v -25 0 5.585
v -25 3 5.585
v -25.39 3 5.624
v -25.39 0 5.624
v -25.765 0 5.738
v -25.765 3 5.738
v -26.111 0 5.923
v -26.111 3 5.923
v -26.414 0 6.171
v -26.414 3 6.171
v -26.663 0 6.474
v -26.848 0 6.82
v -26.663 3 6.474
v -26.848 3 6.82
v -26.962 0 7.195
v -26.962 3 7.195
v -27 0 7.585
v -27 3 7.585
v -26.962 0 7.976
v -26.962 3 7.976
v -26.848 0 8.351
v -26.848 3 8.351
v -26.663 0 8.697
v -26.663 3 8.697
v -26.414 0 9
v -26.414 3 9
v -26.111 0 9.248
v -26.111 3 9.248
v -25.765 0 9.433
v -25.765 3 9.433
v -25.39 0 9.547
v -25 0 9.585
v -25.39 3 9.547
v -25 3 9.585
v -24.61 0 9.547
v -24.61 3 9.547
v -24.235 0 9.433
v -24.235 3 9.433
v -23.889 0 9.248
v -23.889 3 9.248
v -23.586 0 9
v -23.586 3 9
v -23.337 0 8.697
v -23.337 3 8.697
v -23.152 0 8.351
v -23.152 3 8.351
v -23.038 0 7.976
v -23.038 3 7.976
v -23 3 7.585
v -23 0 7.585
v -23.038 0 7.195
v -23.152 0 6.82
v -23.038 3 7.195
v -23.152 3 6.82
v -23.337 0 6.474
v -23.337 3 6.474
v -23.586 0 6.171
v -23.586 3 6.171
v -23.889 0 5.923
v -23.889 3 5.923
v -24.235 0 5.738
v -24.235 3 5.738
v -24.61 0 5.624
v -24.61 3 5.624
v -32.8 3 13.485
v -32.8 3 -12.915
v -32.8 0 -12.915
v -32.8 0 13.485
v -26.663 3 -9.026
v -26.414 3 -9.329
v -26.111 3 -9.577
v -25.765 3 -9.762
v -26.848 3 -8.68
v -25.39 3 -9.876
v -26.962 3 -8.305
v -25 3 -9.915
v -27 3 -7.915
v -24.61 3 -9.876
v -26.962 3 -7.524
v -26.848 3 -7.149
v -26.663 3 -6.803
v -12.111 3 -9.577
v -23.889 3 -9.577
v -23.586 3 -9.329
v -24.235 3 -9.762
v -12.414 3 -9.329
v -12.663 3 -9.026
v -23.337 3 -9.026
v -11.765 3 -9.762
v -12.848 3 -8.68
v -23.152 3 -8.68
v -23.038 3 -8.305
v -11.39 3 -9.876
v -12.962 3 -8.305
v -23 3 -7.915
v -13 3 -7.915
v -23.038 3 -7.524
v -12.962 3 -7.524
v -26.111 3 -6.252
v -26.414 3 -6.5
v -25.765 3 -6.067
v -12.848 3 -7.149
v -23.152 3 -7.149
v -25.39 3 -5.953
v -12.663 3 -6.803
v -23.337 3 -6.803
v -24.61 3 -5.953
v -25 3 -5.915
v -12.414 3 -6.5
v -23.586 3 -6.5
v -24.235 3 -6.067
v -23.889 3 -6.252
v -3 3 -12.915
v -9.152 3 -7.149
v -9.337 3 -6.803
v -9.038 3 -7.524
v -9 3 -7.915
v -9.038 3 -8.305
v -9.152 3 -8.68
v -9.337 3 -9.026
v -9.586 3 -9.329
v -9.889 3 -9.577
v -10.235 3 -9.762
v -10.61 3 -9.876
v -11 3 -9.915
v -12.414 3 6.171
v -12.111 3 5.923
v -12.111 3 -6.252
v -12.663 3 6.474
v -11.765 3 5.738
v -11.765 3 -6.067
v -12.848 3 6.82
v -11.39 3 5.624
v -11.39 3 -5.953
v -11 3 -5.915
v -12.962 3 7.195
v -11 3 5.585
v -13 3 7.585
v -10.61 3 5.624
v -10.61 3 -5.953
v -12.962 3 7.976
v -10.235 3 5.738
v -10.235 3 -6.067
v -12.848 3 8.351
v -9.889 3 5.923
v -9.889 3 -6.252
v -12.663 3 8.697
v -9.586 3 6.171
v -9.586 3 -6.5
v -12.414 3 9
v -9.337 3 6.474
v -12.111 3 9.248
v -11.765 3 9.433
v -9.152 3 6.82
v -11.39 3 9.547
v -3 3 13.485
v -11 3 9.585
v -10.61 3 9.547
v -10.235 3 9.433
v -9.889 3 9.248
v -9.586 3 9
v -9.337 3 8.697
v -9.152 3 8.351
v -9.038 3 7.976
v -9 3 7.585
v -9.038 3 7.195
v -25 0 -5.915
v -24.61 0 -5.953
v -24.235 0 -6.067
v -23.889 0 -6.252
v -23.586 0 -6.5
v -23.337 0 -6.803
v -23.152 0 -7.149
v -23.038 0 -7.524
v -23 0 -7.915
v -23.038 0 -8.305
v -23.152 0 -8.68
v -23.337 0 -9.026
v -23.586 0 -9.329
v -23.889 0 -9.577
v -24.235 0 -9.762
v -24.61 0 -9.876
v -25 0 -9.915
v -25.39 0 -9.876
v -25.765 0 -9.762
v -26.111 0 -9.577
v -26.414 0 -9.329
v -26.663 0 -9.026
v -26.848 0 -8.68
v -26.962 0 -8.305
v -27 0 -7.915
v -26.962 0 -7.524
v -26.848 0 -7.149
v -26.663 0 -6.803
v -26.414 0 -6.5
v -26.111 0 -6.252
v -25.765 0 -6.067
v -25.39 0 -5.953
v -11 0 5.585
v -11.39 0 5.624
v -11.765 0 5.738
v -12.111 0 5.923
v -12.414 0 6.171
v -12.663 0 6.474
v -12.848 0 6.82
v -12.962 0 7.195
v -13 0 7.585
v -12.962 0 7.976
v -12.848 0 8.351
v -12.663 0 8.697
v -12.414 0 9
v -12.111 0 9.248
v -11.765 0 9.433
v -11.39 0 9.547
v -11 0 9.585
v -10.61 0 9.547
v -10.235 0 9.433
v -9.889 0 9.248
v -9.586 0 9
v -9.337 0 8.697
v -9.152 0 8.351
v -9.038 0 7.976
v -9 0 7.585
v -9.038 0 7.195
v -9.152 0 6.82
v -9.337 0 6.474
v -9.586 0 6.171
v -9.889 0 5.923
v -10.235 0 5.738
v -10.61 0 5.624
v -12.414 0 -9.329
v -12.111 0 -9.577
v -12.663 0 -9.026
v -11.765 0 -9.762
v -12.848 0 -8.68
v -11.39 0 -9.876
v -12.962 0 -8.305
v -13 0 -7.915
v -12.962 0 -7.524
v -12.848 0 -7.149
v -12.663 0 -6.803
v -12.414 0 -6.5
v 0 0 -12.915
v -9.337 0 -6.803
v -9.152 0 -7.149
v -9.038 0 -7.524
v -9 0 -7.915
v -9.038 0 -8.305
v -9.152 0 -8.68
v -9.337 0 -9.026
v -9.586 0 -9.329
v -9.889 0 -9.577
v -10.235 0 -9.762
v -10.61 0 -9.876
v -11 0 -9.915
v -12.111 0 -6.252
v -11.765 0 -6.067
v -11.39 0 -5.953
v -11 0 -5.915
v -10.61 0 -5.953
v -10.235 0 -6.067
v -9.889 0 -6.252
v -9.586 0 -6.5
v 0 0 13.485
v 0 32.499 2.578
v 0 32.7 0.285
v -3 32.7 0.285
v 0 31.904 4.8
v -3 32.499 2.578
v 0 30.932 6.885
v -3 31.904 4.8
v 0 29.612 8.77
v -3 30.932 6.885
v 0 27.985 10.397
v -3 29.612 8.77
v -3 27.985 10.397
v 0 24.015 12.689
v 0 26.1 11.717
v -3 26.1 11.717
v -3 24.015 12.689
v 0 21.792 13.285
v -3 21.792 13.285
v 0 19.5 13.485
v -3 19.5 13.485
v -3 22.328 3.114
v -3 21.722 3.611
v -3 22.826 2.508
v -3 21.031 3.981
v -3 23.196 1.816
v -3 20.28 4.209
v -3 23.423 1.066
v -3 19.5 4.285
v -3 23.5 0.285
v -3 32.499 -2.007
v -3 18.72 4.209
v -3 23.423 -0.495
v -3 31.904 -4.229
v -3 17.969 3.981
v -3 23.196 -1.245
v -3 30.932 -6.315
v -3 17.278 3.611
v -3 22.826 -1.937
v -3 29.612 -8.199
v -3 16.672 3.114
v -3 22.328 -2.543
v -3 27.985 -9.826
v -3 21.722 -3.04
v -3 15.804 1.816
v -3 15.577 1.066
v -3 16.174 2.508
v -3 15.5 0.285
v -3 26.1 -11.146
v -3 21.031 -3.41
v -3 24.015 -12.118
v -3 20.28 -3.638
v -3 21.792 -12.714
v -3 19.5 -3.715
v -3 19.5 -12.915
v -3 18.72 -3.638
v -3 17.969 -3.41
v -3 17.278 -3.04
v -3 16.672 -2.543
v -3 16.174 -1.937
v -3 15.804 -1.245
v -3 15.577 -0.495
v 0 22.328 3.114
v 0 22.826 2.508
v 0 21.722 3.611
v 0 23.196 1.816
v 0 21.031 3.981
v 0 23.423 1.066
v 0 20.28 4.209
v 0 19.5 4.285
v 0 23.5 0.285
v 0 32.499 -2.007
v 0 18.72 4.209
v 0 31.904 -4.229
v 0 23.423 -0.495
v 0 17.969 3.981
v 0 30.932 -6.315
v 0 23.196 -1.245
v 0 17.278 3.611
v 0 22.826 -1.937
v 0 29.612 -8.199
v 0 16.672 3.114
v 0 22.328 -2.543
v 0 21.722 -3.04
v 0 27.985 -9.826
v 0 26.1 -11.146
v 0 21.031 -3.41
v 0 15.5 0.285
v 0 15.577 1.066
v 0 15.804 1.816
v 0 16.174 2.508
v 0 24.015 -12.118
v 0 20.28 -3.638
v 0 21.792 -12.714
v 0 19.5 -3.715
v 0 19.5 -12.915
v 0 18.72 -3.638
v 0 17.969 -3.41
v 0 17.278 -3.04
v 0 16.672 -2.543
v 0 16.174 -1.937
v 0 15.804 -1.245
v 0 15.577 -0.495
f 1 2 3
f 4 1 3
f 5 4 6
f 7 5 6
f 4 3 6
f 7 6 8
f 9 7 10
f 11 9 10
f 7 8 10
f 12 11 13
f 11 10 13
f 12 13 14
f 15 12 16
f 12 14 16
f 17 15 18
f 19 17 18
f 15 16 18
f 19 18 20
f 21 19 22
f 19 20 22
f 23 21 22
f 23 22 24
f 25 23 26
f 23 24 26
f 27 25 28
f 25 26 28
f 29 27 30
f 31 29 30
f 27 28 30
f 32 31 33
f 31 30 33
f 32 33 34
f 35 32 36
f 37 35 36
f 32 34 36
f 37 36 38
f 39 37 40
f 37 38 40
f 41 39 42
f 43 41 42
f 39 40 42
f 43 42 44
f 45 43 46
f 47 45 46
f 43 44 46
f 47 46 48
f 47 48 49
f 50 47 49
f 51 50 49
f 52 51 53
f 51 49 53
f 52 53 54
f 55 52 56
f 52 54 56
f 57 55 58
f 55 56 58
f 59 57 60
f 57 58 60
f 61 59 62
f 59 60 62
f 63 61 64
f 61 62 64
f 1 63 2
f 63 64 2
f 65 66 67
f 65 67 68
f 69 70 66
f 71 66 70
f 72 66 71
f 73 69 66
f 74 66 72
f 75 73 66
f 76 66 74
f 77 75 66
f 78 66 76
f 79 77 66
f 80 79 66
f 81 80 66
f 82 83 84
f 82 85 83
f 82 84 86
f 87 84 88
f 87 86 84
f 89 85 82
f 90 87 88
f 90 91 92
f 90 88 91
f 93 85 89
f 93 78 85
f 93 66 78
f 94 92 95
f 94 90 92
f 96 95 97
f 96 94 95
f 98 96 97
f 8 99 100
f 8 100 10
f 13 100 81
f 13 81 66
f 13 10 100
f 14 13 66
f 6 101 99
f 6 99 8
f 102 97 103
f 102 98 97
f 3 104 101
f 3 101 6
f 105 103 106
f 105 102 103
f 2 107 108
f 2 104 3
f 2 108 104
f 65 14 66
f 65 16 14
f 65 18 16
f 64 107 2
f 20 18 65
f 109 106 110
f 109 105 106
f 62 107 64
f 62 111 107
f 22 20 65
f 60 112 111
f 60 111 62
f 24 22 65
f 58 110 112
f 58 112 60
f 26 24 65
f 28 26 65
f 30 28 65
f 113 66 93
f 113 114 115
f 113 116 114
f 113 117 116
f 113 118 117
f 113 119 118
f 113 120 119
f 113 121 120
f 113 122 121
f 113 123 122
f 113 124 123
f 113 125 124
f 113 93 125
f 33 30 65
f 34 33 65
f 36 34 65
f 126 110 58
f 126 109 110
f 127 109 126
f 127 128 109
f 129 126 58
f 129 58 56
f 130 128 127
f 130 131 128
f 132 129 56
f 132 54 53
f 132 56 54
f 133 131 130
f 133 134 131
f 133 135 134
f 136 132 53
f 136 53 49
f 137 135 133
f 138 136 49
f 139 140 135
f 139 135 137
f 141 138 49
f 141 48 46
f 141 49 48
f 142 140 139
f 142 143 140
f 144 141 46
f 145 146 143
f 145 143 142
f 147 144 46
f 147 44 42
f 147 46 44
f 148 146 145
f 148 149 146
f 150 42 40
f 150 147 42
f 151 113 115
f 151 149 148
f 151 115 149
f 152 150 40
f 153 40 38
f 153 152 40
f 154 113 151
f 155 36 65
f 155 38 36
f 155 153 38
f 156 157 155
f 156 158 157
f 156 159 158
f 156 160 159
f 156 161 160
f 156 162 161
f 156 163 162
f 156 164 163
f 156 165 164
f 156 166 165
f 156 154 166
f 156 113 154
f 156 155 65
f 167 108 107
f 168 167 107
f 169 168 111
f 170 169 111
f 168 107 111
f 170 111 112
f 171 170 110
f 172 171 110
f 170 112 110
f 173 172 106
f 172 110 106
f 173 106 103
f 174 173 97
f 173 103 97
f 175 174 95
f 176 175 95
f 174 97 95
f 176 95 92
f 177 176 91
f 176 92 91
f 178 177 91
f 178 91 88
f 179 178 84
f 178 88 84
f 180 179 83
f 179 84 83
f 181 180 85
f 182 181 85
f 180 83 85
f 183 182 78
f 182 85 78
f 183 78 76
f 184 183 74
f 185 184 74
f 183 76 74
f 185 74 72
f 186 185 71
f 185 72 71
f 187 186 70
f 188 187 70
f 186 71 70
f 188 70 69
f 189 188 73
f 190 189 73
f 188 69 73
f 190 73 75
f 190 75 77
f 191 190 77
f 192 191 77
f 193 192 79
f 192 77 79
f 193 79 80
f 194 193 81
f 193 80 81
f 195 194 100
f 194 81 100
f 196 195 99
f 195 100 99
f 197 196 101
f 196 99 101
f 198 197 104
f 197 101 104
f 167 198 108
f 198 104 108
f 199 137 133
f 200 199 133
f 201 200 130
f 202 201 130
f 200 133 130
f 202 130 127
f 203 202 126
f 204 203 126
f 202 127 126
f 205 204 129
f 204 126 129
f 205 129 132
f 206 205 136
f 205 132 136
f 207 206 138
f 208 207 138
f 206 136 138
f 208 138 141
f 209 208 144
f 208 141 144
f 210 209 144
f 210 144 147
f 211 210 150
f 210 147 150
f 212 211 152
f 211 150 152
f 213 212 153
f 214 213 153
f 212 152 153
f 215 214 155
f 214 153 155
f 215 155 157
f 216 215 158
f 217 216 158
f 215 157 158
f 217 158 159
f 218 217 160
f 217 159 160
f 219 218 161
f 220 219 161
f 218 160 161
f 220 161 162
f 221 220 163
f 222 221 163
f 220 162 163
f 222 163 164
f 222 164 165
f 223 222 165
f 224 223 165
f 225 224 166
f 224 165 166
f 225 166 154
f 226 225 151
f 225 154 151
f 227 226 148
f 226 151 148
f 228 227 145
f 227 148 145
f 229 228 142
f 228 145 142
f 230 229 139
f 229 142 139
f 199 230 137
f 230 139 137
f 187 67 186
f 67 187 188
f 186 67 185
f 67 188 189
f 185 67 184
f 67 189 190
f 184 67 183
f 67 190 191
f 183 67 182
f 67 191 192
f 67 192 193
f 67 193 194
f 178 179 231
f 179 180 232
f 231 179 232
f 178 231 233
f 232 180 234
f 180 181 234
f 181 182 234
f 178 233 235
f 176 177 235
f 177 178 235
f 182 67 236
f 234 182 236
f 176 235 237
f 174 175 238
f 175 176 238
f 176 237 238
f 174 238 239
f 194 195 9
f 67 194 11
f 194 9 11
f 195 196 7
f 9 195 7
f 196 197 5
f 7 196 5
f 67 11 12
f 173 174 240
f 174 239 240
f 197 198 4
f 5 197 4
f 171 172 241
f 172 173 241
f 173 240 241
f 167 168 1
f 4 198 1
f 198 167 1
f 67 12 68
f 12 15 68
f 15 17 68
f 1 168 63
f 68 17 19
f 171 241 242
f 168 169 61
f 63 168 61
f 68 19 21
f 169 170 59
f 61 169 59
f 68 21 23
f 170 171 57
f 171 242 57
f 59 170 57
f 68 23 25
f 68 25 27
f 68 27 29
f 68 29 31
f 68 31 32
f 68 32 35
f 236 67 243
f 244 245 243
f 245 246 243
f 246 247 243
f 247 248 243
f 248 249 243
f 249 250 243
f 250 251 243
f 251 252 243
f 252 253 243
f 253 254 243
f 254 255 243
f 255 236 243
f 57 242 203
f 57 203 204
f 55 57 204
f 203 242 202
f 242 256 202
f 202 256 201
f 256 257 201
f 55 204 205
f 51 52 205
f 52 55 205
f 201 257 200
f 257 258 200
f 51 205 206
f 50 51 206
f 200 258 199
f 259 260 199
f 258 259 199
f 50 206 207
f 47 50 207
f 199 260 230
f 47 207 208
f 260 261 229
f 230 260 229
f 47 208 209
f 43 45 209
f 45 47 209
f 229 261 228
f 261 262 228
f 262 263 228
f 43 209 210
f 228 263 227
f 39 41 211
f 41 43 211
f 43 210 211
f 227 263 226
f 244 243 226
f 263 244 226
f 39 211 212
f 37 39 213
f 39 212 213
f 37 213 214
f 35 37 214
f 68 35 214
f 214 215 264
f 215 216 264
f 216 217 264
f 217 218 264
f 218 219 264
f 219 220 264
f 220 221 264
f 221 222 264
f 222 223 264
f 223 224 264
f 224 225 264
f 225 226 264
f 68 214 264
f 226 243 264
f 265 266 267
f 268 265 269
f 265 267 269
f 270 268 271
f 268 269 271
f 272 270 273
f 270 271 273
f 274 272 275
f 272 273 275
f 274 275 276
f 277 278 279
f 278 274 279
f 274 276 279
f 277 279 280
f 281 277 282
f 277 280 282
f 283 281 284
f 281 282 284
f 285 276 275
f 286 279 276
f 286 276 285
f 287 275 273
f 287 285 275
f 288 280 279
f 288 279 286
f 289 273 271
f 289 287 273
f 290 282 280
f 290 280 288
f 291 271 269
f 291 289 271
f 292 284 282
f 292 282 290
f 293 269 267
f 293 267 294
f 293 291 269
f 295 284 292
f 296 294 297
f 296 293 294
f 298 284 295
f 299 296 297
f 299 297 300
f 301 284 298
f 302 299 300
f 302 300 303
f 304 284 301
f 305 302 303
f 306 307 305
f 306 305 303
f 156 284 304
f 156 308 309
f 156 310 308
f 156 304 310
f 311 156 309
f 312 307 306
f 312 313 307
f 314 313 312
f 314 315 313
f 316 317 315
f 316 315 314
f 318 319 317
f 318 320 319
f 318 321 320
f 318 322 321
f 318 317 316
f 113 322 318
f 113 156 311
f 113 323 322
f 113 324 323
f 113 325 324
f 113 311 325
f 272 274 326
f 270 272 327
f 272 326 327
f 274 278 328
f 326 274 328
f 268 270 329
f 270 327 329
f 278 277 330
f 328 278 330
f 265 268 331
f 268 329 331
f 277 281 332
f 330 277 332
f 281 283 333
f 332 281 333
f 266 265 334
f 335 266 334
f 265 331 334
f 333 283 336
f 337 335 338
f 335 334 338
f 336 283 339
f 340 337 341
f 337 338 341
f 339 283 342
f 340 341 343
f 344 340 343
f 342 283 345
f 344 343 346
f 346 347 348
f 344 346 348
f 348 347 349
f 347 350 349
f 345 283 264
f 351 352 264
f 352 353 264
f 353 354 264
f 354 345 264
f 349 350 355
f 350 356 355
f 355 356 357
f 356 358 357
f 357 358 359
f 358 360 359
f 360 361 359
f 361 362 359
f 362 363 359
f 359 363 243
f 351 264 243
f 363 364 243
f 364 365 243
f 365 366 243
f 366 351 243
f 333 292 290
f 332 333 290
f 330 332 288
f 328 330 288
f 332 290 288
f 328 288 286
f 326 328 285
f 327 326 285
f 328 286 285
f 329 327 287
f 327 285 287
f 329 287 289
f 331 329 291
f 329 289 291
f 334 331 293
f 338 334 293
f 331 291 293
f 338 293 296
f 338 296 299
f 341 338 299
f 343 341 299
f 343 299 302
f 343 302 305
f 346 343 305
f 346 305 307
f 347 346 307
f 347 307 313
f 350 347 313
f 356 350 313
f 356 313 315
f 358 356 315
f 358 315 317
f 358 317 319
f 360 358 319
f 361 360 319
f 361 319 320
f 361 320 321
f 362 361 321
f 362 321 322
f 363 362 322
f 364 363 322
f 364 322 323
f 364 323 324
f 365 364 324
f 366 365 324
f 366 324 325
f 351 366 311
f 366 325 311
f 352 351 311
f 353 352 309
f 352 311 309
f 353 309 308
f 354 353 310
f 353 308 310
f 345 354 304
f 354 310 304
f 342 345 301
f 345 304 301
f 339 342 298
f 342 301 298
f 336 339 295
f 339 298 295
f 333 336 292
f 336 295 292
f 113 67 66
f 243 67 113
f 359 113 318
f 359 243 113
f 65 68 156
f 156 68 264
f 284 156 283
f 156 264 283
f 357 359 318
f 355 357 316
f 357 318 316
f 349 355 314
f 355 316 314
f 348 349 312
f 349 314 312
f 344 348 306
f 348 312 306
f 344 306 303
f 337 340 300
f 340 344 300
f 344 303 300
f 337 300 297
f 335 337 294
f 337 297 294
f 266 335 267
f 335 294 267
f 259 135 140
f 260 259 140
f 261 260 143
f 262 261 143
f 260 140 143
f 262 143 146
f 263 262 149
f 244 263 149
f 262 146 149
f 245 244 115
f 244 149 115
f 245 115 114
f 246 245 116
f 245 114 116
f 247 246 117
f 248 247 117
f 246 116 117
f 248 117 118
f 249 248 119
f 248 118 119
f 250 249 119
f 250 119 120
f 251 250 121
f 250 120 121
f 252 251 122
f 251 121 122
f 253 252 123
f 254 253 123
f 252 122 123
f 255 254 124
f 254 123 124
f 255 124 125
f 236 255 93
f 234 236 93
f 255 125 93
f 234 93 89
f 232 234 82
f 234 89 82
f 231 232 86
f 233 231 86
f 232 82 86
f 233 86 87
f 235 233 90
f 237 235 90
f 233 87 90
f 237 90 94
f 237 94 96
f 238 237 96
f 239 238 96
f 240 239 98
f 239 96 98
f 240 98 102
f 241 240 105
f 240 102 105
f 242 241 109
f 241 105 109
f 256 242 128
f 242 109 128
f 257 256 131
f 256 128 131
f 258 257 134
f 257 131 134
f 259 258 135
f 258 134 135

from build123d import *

# Parameters (mm, degrees)
BOSS_EXTRUDE1_OUTLINE_W = 3
BOSS_EXTRUDE1_OUTLINE_H = 26.4
BOSS_EXTRUDE1_DEPTH     = 32.7
SKETCH2_W               = 26.4
SKETCH2_H               = 3
BOSS_EXTRUDE2_DEPTH     = 29.8
SKETCH3_R               = 2
CUT_EXTRUDE1_DEPTH      = 3
CUT_EXTRUDE3_DEPTH      = 12
SKETCH6_R               = 4
CUT_EXTRUDE4_DEPTH      = 12


# Read off the part's stored shape, not the designer's step: Boss-Extrude1
with BuildPart() as part:
    # Boss-Extrude1 outline → Boss-Extrude1 (new body)
    with BuildSketch(Plane(origin=(0, 0, 0), x_dir=(1, 0, 0), z_dir=(0, 1, 0))):
        with Locations((-1.5, -0.285443038)):
            Rectangle(BOSS_EXTRUDE1_OUTLINE_W, BOSS_EXTRUDE1_OUTLINE_H)
    extrude(amount=BOSS_EXTRUDE1_DEPTH)

    # Sketch2 → Boss-Extrude2 (add)
    with BuildSketch(Plane.ZY.offset(3)):
        with Locations((0.285443038, 1.5)):
            Rectangle(SKETCH2_W, SKETCH2_H)
    extrude(amount=BOSS_EXTRUDE2_DEPTH)

    # Sketch3 → Cut-Extrude1 (cut)
    with BuildSketch(Plane(origin=(0, 3, 0), x_dir=(1, 0, 0), z_dir=(0, 1, 0))):
        with Locations(Location((-25, 7.914556962, 0), (0, 0, 270))):
            Circle(SKETCH3_R)
        with Locations(Location((-11, 7.914556962, 0), (0, 0, 270))):
            Circle(SKETCH3_R)
        with Locations(Location((-11, -7.585443038, 0), (0, 0, 90))):
            Circle(SKETCH3_R)
        with Locations(Location((-25, -7.585443038, 0), (0, 0, 90))):
            Circle(SKETCH3_R)
    extrude(amount=-CUT_EXTRUDE1_DEPTH, mode=Mode.SUBTRACT)

    # Sketch5 → Cut-Extrude3 (cut)
    with BuildSketch(Plane.ZY.offset(3)):
        with BuildLine():
            Line((0.285443053, 32.7), (-12.914556962, 32.7))
            Line((-12.914556962, 32.7), (-12.914556962, 19.5))
            ThreePointArc((-12.914556962, 19.5), (-9.048366468, 28.833809517), (0.285443053, 32.7))
        make_face()
        with BuildLine():
            Line((13.485443038, 32.7), (0.285443053, 32.7))
            ThreePointArc((0.285443053, 32.7), (9.619252555, 28.833809506), (13.485443038, 19.5))
            Line((13.485443038, 19.5), (13.485443038, 32.7))
        make_face()
    extrude(amount=-CUT_EXTRUDE3_DEPTH, mode=Mode.SUBTRACT)

    # Sketch6 → Cut-Extrude4 (cut)
    with BuildSketch(Plane.ZY.offset(3)):
        with Locations((0.285443038, 19.5)):
            Circle(SKETCH6_R)
    extrude(amount=-CUT_EXTRUDE4_DEPTH, mode=Mode.SUBTRACT)


solid = part.part
